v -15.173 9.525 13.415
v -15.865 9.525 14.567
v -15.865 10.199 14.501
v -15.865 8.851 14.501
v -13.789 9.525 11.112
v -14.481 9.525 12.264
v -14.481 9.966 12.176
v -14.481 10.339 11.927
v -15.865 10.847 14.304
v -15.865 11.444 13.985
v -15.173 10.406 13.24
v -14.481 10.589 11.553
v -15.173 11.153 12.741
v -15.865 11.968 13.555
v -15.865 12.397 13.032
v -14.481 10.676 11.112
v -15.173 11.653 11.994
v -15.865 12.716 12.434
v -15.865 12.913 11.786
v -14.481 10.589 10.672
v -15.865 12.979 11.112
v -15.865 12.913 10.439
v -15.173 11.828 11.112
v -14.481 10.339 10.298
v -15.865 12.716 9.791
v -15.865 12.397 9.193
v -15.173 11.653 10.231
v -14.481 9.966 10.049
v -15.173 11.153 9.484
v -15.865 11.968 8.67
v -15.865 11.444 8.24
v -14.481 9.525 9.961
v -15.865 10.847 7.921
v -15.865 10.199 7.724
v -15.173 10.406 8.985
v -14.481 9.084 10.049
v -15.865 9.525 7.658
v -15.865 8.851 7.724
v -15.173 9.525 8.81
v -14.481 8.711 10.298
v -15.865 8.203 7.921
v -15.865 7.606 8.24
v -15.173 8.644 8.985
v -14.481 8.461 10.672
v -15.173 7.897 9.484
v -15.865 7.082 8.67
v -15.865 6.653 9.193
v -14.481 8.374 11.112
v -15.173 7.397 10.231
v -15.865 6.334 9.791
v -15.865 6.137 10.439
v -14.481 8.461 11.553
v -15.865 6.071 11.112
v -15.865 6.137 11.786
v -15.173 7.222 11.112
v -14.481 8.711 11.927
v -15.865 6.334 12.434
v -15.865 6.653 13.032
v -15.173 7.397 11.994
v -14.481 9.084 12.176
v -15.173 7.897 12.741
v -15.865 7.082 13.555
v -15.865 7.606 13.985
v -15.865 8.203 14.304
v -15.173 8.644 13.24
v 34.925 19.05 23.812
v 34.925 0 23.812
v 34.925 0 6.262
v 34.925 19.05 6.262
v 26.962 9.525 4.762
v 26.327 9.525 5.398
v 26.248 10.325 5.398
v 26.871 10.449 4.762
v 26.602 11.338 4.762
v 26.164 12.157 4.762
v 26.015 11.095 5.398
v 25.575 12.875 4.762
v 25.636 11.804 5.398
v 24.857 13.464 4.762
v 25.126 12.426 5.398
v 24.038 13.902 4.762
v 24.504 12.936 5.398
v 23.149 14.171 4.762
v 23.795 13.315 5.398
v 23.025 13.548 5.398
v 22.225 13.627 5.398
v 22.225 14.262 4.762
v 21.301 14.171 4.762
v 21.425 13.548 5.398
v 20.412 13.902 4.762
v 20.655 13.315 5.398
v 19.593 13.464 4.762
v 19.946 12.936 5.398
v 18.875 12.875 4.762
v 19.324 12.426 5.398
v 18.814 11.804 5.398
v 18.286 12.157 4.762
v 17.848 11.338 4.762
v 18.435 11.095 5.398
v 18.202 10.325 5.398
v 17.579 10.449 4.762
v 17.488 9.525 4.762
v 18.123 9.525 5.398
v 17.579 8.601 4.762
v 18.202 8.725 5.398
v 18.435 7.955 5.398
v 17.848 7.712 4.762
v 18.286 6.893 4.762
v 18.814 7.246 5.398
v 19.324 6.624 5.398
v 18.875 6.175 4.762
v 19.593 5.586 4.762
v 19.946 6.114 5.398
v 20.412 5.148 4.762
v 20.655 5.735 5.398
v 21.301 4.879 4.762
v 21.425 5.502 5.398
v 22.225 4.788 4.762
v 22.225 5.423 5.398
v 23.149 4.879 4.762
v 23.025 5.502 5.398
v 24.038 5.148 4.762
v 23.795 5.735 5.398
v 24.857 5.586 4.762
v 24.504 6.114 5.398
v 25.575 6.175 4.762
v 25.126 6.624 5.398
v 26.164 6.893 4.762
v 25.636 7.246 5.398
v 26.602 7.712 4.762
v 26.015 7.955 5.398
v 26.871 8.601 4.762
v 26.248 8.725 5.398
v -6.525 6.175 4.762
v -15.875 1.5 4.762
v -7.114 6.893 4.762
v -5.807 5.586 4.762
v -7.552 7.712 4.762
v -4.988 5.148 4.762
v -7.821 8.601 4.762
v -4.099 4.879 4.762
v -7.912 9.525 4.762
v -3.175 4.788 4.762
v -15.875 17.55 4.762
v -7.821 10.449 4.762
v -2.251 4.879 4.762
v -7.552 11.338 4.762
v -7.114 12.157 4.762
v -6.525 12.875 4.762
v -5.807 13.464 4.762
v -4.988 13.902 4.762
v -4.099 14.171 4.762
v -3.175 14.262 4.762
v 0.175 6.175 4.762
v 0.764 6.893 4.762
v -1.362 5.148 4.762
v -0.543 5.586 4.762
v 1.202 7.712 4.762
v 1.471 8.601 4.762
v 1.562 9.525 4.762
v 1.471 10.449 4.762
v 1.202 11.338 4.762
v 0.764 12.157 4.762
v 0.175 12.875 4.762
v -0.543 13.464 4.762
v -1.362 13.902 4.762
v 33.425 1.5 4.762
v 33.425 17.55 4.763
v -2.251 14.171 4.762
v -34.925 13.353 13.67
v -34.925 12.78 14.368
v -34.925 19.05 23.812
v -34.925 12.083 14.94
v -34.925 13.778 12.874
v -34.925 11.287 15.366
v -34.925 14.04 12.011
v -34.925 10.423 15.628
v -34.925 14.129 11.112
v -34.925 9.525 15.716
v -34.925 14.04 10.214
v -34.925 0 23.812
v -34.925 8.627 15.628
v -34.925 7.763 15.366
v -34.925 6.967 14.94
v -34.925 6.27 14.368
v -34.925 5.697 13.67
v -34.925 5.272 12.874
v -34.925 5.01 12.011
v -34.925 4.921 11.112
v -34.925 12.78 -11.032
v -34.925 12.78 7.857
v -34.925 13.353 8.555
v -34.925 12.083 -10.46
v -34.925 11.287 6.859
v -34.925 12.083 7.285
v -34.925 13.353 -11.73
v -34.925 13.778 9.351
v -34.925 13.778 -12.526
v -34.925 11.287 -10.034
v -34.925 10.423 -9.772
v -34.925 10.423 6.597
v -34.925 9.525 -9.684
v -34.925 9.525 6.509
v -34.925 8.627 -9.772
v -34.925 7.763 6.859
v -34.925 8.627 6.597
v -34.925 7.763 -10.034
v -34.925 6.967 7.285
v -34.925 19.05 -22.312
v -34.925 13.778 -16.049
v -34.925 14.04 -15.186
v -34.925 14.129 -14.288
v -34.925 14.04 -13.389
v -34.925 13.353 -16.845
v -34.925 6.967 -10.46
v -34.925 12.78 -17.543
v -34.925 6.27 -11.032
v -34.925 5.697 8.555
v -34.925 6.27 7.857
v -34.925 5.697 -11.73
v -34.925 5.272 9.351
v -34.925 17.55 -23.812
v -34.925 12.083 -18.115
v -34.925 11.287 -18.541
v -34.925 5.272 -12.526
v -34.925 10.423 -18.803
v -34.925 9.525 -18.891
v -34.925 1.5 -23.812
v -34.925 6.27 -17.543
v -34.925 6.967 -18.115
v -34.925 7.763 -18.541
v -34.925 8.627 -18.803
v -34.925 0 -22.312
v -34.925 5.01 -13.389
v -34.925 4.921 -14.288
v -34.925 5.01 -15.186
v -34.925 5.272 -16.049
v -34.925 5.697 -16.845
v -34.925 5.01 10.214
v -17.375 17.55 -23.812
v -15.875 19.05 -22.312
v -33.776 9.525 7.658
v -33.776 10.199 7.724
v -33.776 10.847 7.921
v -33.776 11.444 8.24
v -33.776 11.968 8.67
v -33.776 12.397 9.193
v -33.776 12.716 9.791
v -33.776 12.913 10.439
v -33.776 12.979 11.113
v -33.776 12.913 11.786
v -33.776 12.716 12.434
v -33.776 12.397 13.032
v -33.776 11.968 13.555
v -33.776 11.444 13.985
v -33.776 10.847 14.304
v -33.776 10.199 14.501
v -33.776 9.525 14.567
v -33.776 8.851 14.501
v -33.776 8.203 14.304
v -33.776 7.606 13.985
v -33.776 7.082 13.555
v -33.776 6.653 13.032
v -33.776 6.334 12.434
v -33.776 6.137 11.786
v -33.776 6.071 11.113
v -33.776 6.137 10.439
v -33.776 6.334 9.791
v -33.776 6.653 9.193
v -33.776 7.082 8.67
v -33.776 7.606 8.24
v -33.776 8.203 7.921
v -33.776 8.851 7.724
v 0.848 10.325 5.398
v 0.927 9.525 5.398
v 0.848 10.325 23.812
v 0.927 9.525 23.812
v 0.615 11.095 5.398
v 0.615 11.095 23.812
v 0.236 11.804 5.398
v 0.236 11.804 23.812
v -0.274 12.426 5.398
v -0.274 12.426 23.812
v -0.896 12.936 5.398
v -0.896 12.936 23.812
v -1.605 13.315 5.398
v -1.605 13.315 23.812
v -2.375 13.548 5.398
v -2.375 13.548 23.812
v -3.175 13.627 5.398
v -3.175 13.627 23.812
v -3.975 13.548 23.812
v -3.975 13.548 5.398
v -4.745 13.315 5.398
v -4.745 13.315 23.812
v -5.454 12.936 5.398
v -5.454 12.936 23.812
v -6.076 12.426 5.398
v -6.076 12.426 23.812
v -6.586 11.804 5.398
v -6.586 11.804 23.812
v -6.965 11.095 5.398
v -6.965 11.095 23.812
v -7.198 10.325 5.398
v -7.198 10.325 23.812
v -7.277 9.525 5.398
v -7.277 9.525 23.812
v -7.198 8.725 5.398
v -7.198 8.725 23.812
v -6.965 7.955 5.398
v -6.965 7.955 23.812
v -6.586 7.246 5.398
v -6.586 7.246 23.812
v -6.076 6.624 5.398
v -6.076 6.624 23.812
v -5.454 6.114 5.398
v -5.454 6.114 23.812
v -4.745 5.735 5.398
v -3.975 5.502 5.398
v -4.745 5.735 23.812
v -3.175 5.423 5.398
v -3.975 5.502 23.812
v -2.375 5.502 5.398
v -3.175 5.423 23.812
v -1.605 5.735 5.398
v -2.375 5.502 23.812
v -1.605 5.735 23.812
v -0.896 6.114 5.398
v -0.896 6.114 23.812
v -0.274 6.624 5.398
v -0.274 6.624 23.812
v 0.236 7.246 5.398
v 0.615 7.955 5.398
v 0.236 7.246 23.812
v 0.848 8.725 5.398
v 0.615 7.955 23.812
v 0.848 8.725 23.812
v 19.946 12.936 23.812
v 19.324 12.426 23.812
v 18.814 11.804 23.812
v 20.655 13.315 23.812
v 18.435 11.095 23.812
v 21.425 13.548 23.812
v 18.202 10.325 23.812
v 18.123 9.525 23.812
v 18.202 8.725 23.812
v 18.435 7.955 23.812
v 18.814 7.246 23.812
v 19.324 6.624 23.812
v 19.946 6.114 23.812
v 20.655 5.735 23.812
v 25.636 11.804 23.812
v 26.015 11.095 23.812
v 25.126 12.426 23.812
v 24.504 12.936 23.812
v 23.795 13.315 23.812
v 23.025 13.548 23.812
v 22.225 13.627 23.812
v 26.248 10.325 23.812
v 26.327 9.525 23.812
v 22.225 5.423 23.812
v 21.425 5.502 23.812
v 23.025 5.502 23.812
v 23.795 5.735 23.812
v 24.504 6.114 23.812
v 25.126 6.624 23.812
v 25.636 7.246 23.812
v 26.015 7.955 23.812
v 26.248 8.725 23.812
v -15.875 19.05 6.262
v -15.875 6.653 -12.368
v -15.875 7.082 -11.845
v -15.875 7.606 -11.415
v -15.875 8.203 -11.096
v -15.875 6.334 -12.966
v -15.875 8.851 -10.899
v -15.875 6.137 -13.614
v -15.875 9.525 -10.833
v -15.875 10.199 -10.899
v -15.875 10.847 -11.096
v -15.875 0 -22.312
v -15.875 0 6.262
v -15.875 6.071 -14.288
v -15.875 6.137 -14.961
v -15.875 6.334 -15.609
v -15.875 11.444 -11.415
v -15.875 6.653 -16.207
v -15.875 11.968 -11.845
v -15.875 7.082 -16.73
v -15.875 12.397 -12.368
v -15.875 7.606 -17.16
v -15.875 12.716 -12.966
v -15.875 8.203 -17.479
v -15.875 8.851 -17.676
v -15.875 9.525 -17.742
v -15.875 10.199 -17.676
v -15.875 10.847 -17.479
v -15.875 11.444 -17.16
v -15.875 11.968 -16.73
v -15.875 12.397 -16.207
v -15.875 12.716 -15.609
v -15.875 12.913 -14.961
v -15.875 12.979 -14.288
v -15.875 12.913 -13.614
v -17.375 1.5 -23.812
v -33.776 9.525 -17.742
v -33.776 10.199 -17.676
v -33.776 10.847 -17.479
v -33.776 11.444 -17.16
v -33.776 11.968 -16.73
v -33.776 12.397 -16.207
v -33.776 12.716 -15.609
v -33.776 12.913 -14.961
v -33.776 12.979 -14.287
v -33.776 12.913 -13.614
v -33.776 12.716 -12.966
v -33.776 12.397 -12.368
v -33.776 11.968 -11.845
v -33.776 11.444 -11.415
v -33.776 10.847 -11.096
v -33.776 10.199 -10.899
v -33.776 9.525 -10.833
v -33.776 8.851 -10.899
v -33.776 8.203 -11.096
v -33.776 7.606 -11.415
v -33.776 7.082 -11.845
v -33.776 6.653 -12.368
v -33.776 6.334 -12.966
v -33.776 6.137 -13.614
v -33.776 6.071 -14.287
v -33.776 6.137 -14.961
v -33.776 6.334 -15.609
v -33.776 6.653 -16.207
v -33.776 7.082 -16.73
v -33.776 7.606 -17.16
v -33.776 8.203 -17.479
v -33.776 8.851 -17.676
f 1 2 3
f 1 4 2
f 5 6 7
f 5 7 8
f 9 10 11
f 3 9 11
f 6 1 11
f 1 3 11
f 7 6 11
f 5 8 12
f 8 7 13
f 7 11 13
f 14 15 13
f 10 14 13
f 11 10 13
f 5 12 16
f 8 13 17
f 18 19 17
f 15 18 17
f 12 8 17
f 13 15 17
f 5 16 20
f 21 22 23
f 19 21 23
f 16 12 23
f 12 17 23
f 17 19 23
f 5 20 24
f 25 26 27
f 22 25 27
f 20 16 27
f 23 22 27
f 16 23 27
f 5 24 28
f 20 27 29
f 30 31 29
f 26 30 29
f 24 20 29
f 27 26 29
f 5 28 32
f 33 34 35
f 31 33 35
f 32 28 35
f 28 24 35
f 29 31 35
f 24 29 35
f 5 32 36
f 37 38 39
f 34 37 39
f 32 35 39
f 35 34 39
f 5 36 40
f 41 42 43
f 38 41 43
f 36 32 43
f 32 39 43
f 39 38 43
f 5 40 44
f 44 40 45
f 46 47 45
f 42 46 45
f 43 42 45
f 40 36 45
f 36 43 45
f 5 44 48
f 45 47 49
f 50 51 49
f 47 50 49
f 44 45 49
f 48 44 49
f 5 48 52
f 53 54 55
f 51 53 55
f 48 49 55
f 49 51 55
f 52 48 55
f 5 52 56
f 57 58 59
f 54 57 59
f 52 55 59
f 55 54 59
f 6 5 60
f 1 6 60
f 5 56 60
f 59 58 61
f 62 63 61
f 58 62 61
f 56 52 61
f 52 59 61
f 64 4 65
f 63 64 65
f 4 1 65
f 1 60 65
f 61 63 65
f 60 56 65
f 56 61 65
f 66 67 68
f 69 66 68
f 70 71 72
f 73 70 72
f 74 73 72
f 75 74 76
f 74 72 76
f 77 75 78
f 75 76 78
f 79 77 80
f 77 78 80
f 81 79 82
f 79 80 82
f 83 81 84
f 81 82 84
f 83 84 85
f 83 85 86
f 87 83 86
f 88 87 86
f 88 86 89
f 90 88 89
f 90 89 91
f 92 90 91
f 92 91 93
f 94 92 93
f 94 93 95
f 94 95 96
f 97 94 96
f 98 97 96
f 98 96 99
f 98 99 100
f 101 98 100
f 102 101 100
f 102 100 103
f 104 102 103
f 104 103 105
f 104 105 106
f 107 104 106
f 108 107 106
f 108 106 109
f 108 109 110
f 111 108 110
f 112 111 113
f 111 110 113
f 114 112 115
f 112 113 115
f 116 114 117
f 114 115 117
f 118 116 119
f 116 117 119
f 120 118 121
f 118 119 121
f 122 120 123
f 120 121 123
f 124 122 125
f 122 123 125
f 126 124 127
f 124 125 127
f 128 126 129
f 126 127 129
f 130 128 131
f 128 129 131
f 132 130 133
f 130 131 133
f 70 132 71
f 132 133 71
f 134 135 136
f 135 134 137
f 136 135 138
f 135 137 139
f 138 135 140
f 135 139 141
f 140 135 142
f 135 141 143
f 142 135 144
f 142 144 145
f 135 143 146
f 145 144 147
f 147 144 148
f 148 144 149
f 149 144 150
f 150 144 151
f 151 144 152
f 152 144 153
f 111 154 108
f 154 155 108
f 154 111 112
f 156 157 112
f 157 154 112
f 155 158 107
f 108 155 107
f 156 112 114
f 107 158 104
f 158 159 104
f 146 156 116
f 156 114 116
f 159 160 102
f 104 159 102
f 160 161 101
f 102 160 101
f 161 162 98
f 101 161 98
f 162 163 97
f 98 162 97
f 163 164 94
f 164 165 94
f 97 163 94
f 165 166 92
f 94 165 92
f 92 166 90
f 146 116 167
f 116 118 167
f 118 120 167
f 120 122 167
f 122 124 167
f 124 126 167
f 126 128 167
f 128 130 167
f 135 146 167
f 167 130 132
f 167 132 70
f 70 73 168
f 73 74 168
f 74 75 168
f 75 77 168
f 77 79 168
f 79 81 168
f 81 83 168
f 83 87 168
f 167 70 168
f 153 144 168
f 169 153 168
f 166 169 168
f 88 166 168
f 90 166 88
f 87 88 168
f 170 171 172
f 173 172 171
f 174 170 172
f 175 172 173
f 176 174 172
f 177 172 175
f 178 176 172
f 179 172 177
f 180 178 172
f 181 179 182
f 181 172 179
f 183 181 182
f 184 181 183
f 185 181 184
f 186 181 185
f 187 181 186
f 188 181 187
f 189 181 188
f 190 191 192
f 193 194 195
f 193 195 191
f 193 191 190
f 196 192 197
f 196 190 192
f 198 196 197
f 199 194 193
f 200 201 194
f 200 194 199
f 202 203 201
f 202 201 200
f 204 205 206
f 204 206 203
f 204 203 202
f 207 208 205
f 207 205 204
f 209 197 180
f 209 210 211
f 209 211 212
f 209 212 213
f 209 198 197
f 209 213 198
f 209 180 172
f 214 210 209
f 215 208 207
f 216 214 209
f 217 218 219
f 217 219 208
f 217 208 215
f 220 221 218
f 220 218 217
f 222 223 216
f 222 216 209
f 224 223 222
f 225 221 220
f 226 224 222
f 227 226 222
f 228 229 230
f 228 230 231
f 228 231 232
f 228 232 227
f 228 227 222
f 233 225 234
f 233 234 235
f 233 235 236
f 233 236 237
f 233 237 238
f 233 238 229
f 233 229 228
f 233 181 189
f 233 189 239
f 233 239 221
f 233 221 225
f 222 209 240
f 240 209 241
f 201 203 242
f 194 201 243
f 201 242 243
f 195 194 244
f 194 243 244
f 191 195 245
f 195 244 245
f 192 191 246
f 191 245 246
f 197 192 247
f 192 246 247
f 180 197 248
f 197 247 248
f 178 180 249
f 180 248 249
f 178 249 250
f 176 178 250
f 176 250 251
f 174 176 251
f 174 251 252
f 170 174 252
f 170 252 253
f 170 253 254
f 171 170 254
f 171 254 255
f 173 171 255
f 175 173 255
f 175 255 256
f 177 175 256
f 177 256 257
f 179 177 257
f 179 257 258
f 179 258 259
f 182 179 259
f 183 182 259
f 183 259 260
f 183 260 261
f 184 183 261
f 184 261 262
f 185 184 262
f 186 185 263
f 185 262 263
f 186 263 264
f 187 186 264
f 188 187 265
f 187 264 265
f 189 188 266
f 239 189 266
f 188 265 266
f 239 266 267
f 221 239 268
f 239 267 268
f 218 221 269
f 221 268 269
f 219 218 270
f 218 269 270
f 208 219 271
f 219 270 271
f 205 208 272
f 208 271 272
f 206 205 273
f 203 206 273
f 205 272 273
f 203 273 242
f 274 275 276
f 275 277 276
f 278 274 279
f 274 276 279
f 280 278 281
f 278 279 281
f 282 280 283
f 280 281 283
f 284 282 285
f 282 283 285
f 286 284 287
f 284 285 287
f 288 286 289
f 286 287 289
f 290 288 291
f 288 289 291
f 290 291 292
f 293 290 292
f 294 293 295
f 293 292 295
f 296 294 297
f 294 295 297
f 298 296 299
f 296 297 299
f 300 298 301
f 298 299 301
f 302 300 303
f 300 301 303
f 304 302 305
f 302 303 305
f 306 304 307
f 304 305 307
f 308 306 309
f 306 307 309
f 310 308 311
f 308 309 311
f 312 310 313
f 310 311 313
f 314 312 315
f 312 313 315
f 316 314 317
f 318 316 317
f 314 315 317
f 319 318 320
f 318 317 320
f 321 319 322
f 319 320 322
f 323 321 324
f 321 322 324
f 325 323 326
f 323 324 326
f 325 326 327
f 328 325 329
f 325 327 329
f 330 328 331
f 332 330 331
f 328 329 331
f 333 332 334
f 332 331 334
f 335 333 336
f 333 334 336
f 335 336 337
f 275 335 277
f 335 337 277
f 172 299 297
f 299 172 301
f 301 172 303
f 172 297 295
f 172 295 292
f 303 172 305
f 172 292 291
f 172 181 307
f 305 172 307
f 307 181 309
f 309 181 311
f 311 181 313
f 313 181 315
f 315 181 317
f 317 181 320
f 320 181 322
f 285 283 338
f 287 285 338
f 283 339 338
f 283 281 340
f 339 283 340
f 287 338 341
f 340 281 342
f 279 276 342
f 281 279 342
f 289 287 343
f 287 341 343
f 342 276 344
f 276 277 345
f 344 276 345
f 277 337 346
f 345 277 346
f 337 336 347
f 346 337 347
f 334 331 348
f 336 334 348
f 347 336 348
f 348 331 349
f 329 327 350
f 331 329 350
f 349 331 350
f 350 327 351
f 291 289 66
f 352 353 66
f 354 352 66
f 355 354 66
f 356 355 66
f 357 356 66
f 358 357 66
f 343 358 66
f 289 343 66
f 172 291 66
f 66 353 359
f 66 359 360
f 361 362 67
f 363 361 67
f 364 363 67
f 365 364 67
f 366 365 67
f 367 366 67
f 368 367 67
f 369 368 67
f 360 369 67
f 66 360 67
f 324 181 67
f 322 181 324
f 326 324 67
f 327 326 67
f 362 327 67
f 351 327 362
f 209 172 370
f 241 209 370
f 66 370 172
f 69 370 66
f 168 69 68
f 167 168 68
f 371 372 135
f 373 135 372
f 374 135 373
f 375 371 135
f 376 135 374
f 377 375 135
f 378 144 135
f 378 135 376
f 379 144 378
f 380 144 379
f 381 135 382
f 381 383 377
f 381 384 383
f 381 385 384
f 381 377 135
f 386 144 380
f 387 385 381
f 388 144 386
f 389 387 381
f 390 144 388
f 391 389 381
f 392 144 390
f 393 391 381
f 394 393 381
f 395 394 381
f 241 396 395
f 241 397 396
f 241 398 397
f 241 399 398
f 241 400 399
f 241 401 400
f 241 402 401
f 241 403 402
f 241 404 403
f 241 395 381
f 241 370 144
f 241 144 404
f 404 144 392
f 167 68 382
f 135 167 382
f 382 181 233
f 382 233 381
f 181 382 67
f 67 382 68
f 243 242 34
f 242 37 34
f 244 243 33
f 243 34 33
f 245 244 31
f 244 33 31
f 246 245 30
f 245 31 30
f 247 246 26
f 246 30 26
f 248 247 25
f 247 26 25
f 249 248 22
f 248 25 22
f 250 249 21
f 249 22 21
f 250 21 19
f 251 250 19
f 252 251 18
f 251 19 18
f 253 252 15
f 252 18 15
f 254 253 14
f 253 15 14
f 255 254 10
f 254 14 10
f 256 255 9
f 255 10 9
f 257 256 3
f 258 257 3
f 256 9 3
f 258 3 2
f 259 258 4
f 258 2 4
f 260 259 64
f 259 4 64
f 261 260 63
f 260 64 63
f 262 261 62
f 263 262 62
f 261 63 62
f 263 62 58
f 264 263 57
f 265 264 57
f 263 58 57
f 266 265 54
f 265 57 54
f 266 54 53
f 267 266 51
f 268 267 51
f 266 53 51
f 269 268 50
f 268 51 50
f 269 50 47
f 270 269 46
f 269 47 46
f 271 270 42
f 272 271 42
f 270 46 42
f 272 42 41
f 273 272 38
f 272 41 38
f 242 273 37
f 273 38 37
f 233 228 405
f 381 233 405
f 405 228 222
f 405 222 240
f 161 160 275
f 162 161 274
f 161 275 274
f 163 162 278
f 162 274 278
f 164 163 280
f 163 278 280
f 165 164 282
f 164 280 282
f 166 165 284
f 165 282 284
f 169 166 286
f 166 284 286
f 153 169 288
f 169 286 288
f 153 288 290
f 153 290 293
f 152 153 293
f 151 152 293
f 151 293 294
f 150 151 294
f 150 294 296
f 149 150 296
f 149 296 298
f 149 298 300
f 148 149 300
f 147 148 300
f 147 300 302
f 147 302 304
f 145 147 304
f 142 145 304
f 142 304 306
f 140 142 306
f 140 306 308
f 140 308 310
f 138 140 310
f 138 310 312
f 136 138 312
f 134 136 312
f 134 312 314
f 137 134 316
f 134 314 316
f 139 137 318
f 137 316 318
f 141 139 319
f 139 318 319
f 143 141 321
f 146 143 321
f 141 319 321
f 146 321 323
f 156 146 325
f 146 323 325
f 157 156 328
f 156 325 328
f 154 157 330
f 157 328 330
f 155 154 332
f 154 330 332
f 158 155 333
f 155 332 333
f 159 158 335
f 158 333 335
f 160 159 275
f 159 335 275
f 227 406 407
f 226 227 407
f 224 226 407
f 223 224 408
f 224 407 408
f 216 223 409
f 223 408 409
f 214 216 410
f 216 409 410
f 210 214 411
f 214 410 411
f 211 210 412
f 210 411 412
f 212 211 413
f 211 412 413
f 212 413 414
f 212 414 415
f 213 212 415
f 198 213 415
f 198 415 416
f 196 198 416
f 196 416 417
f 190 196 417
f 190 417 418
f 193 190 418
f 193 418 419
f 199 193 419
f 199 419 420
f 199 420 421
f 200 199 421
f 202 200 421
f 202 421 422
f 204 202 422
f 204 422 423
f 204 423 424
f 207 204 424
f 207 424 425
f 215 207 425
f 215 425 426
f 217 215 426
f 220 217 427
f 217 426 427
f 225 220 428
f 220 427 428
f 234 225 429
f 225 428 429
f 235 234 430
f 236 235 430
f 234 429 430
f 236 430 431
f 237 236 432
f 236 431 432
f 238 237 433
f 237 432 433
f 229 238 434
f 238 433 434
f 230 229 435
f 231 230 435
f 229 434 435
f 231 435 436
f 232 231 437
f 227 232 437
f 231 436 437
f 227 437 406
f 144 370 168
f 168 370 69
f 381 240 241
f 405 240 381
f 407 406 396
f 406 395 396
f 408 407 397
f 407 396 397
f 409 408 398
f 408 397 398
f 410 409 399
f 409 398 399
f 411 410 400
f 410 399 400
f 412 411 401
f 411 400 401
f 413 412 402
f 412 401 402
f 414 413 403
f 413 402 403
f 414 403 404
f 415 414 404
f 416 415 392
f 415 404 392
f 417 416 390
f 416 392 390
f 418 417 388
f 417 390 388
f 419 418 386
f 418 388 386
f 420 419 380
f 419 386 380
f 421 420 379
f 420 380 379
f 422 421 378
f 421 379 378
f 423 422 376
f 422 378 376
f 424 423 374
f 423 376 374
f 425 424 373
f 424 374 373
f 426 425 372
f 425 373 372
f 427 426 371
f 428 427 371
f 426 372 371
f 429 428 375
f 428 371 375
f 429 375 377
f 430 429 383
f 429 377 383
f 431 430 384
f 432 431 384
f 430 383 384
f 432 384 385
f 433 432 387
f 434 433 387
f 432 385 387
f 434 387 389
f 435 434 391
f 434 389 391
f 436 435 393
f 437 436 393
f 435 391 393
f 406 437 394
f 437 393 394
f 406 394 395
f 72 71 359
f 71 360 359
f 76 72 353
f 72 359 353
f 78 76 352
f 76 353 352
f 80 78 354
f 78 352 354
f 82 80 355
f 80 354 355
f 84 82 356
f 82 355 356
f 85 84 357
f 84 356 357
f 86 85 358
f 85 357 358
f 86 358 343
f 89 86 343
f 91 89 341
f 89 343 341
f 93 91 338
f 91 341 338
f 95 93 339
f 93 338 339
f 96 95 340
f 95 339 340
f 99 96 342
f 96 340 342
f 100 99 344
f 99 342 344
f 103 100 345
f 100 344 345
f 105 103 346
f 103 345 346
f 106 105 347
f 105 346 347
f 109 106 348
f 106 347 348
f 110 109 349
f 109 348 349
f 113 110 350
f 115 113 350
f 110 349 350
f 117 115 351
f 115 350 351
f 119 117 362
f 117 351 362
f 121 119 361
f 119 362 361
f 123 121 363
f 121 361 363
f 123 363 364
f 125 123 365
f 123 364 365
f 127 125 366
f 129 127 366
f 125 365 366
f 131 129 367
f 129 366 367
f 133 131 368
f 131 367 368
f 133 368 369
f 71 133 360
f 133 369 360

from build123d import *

# Parameters (mm, degrees)
SKETCH1_W                          = 69.85
SKETCH1_H                          = 47.625
BOSS_EXTRUDE1_DEPTH                = 19.05
CUT_EXTRUDE1_REACH                 = 21.05
SKETCH2_W                          = 50.8
SKETCH2_H                          = 28.575
F_5_16_24_TAPPED_HOLE1_D           = 6.9088
F_5_16_24_TAPPED_HOLE1_DEPTH       = 19.06
F_5_16_24_TAPPED_HOLE1_CSINK_D     = 9.2075
F_5_16_24_TAPPED_HOLE1_CSINK_ANGLE = 90
F_5_16_24_TAPPED_HOLE1_TIP         = 2.075612922
F_5_16_CLEARANCE_HOLE1_D           = 8.2042
F_5_16_CLEARANCE_HOLE1_CSINK_D     = 9.4742
F_5_16_CLEARANCE_HOLE1_CSINK_ANGLE = 90
CHAMFER1_SIZE                      = 1.5


with BuildPart() as part:
    # Sketch1 → Boss-Extrude1 (new body)
    with BuildSketch(Plane(origin=(0, 0, 0), x_dir=(1, 0, 0), z_dir=(0, 1, 0))):
        Rectangle(SKETCH1_W, SKETCH1_H)
    extrude(amount=BOSS_EXTRUDE1_DEPTH)

    # Sketch2 → Cut-Extrude1 (cut, up to next)
    with BuildSketch(Plane(origin=(0, 19.05, 0), x_dir=(1, 0, 0), z_dir=(0, 1, 0)), mode=Mode.PRIVATE) as cut_extrude1_sk1:
        with Locations((9.525, 9.525)):
            Rectangle(SKETCH2_W, SKETCH2_H)
    cut_extrude1_tool1 = extrude(cut_extrude1_sk1.sketch, amount=-CUT_EXTRUDE1_REACH, mode=Mode.PRIVATE) & part.part
    add(cut_extrude1_tool1.solids().sort_by_distance((9.525, 19.05, -9.525))[0], mode=Mode.SUBTRACT)

    # 5/16-24 Tapped Hole1
    with Locations(Plane.ZY.offset(34.925)):
        with Locations((-14.2875, 9.525), (11.1125, 9.525)):
            CounterSinkHole(F_5_16_24_TAPPED_HOLE1_D / 2, F_5_16_24_TAPPED_HOLE1_CSINK_D / 2, depth=F_5_16_24_TAPPED_HOLE1_DEPTH, counter_sink_angle=F_5_16_24_TAPPED_HOLE1_CSINK_ANGLE)
            with Locations((0, 0, -(F_5_16_24_TAPPED_HOLE1_DEPTH + F_5_16_24_TAPPED_HOLE1_TIP / 2))):  # 118° drill point
                Cone(0, F_5_16_24_TAPPED_HOLE1_D / 2, F_5_16_24_TAPPED_HOLE1_TIP, mode=Mode.SUBTRACT)

    # 5/16 Clearance Hole1 (through all)
    with Locations(Plane(origin=(0, 0, 4.7625), x_dir=(-1, 0, 0), z_dir=(0, 0, -1))):
        with Locations((3.175, 9.525), (-22.225, 9.525)):
            CounterSinkHole(F_5_16_CLEARANCE_HOLE1_D / 2, F_5_16_CLEARANCE_HOLE1_CSINK_D / 2, counter_sink_angle=F_5_16_CLEARANCE_HOLE1_CSINK_ANGLE)

    # Chamfer1
    chamfer1_edges = [part.edges().sort_by_distance(p)[0] for p in [
        (-25.4, 0, -23.8125),
        (-25.4, 19.05, -23.8125),
        (9.525, 0, 4.7625),
        (34.925, 9.525, 4.7625),
        (-15.875, 9.525, -23.8125),
        (9.525, 19.05, 4.7625),
    ]]
    chamfer(chamfer1_edges, length=CHAMFER1_SIZE)


solid = part.part
